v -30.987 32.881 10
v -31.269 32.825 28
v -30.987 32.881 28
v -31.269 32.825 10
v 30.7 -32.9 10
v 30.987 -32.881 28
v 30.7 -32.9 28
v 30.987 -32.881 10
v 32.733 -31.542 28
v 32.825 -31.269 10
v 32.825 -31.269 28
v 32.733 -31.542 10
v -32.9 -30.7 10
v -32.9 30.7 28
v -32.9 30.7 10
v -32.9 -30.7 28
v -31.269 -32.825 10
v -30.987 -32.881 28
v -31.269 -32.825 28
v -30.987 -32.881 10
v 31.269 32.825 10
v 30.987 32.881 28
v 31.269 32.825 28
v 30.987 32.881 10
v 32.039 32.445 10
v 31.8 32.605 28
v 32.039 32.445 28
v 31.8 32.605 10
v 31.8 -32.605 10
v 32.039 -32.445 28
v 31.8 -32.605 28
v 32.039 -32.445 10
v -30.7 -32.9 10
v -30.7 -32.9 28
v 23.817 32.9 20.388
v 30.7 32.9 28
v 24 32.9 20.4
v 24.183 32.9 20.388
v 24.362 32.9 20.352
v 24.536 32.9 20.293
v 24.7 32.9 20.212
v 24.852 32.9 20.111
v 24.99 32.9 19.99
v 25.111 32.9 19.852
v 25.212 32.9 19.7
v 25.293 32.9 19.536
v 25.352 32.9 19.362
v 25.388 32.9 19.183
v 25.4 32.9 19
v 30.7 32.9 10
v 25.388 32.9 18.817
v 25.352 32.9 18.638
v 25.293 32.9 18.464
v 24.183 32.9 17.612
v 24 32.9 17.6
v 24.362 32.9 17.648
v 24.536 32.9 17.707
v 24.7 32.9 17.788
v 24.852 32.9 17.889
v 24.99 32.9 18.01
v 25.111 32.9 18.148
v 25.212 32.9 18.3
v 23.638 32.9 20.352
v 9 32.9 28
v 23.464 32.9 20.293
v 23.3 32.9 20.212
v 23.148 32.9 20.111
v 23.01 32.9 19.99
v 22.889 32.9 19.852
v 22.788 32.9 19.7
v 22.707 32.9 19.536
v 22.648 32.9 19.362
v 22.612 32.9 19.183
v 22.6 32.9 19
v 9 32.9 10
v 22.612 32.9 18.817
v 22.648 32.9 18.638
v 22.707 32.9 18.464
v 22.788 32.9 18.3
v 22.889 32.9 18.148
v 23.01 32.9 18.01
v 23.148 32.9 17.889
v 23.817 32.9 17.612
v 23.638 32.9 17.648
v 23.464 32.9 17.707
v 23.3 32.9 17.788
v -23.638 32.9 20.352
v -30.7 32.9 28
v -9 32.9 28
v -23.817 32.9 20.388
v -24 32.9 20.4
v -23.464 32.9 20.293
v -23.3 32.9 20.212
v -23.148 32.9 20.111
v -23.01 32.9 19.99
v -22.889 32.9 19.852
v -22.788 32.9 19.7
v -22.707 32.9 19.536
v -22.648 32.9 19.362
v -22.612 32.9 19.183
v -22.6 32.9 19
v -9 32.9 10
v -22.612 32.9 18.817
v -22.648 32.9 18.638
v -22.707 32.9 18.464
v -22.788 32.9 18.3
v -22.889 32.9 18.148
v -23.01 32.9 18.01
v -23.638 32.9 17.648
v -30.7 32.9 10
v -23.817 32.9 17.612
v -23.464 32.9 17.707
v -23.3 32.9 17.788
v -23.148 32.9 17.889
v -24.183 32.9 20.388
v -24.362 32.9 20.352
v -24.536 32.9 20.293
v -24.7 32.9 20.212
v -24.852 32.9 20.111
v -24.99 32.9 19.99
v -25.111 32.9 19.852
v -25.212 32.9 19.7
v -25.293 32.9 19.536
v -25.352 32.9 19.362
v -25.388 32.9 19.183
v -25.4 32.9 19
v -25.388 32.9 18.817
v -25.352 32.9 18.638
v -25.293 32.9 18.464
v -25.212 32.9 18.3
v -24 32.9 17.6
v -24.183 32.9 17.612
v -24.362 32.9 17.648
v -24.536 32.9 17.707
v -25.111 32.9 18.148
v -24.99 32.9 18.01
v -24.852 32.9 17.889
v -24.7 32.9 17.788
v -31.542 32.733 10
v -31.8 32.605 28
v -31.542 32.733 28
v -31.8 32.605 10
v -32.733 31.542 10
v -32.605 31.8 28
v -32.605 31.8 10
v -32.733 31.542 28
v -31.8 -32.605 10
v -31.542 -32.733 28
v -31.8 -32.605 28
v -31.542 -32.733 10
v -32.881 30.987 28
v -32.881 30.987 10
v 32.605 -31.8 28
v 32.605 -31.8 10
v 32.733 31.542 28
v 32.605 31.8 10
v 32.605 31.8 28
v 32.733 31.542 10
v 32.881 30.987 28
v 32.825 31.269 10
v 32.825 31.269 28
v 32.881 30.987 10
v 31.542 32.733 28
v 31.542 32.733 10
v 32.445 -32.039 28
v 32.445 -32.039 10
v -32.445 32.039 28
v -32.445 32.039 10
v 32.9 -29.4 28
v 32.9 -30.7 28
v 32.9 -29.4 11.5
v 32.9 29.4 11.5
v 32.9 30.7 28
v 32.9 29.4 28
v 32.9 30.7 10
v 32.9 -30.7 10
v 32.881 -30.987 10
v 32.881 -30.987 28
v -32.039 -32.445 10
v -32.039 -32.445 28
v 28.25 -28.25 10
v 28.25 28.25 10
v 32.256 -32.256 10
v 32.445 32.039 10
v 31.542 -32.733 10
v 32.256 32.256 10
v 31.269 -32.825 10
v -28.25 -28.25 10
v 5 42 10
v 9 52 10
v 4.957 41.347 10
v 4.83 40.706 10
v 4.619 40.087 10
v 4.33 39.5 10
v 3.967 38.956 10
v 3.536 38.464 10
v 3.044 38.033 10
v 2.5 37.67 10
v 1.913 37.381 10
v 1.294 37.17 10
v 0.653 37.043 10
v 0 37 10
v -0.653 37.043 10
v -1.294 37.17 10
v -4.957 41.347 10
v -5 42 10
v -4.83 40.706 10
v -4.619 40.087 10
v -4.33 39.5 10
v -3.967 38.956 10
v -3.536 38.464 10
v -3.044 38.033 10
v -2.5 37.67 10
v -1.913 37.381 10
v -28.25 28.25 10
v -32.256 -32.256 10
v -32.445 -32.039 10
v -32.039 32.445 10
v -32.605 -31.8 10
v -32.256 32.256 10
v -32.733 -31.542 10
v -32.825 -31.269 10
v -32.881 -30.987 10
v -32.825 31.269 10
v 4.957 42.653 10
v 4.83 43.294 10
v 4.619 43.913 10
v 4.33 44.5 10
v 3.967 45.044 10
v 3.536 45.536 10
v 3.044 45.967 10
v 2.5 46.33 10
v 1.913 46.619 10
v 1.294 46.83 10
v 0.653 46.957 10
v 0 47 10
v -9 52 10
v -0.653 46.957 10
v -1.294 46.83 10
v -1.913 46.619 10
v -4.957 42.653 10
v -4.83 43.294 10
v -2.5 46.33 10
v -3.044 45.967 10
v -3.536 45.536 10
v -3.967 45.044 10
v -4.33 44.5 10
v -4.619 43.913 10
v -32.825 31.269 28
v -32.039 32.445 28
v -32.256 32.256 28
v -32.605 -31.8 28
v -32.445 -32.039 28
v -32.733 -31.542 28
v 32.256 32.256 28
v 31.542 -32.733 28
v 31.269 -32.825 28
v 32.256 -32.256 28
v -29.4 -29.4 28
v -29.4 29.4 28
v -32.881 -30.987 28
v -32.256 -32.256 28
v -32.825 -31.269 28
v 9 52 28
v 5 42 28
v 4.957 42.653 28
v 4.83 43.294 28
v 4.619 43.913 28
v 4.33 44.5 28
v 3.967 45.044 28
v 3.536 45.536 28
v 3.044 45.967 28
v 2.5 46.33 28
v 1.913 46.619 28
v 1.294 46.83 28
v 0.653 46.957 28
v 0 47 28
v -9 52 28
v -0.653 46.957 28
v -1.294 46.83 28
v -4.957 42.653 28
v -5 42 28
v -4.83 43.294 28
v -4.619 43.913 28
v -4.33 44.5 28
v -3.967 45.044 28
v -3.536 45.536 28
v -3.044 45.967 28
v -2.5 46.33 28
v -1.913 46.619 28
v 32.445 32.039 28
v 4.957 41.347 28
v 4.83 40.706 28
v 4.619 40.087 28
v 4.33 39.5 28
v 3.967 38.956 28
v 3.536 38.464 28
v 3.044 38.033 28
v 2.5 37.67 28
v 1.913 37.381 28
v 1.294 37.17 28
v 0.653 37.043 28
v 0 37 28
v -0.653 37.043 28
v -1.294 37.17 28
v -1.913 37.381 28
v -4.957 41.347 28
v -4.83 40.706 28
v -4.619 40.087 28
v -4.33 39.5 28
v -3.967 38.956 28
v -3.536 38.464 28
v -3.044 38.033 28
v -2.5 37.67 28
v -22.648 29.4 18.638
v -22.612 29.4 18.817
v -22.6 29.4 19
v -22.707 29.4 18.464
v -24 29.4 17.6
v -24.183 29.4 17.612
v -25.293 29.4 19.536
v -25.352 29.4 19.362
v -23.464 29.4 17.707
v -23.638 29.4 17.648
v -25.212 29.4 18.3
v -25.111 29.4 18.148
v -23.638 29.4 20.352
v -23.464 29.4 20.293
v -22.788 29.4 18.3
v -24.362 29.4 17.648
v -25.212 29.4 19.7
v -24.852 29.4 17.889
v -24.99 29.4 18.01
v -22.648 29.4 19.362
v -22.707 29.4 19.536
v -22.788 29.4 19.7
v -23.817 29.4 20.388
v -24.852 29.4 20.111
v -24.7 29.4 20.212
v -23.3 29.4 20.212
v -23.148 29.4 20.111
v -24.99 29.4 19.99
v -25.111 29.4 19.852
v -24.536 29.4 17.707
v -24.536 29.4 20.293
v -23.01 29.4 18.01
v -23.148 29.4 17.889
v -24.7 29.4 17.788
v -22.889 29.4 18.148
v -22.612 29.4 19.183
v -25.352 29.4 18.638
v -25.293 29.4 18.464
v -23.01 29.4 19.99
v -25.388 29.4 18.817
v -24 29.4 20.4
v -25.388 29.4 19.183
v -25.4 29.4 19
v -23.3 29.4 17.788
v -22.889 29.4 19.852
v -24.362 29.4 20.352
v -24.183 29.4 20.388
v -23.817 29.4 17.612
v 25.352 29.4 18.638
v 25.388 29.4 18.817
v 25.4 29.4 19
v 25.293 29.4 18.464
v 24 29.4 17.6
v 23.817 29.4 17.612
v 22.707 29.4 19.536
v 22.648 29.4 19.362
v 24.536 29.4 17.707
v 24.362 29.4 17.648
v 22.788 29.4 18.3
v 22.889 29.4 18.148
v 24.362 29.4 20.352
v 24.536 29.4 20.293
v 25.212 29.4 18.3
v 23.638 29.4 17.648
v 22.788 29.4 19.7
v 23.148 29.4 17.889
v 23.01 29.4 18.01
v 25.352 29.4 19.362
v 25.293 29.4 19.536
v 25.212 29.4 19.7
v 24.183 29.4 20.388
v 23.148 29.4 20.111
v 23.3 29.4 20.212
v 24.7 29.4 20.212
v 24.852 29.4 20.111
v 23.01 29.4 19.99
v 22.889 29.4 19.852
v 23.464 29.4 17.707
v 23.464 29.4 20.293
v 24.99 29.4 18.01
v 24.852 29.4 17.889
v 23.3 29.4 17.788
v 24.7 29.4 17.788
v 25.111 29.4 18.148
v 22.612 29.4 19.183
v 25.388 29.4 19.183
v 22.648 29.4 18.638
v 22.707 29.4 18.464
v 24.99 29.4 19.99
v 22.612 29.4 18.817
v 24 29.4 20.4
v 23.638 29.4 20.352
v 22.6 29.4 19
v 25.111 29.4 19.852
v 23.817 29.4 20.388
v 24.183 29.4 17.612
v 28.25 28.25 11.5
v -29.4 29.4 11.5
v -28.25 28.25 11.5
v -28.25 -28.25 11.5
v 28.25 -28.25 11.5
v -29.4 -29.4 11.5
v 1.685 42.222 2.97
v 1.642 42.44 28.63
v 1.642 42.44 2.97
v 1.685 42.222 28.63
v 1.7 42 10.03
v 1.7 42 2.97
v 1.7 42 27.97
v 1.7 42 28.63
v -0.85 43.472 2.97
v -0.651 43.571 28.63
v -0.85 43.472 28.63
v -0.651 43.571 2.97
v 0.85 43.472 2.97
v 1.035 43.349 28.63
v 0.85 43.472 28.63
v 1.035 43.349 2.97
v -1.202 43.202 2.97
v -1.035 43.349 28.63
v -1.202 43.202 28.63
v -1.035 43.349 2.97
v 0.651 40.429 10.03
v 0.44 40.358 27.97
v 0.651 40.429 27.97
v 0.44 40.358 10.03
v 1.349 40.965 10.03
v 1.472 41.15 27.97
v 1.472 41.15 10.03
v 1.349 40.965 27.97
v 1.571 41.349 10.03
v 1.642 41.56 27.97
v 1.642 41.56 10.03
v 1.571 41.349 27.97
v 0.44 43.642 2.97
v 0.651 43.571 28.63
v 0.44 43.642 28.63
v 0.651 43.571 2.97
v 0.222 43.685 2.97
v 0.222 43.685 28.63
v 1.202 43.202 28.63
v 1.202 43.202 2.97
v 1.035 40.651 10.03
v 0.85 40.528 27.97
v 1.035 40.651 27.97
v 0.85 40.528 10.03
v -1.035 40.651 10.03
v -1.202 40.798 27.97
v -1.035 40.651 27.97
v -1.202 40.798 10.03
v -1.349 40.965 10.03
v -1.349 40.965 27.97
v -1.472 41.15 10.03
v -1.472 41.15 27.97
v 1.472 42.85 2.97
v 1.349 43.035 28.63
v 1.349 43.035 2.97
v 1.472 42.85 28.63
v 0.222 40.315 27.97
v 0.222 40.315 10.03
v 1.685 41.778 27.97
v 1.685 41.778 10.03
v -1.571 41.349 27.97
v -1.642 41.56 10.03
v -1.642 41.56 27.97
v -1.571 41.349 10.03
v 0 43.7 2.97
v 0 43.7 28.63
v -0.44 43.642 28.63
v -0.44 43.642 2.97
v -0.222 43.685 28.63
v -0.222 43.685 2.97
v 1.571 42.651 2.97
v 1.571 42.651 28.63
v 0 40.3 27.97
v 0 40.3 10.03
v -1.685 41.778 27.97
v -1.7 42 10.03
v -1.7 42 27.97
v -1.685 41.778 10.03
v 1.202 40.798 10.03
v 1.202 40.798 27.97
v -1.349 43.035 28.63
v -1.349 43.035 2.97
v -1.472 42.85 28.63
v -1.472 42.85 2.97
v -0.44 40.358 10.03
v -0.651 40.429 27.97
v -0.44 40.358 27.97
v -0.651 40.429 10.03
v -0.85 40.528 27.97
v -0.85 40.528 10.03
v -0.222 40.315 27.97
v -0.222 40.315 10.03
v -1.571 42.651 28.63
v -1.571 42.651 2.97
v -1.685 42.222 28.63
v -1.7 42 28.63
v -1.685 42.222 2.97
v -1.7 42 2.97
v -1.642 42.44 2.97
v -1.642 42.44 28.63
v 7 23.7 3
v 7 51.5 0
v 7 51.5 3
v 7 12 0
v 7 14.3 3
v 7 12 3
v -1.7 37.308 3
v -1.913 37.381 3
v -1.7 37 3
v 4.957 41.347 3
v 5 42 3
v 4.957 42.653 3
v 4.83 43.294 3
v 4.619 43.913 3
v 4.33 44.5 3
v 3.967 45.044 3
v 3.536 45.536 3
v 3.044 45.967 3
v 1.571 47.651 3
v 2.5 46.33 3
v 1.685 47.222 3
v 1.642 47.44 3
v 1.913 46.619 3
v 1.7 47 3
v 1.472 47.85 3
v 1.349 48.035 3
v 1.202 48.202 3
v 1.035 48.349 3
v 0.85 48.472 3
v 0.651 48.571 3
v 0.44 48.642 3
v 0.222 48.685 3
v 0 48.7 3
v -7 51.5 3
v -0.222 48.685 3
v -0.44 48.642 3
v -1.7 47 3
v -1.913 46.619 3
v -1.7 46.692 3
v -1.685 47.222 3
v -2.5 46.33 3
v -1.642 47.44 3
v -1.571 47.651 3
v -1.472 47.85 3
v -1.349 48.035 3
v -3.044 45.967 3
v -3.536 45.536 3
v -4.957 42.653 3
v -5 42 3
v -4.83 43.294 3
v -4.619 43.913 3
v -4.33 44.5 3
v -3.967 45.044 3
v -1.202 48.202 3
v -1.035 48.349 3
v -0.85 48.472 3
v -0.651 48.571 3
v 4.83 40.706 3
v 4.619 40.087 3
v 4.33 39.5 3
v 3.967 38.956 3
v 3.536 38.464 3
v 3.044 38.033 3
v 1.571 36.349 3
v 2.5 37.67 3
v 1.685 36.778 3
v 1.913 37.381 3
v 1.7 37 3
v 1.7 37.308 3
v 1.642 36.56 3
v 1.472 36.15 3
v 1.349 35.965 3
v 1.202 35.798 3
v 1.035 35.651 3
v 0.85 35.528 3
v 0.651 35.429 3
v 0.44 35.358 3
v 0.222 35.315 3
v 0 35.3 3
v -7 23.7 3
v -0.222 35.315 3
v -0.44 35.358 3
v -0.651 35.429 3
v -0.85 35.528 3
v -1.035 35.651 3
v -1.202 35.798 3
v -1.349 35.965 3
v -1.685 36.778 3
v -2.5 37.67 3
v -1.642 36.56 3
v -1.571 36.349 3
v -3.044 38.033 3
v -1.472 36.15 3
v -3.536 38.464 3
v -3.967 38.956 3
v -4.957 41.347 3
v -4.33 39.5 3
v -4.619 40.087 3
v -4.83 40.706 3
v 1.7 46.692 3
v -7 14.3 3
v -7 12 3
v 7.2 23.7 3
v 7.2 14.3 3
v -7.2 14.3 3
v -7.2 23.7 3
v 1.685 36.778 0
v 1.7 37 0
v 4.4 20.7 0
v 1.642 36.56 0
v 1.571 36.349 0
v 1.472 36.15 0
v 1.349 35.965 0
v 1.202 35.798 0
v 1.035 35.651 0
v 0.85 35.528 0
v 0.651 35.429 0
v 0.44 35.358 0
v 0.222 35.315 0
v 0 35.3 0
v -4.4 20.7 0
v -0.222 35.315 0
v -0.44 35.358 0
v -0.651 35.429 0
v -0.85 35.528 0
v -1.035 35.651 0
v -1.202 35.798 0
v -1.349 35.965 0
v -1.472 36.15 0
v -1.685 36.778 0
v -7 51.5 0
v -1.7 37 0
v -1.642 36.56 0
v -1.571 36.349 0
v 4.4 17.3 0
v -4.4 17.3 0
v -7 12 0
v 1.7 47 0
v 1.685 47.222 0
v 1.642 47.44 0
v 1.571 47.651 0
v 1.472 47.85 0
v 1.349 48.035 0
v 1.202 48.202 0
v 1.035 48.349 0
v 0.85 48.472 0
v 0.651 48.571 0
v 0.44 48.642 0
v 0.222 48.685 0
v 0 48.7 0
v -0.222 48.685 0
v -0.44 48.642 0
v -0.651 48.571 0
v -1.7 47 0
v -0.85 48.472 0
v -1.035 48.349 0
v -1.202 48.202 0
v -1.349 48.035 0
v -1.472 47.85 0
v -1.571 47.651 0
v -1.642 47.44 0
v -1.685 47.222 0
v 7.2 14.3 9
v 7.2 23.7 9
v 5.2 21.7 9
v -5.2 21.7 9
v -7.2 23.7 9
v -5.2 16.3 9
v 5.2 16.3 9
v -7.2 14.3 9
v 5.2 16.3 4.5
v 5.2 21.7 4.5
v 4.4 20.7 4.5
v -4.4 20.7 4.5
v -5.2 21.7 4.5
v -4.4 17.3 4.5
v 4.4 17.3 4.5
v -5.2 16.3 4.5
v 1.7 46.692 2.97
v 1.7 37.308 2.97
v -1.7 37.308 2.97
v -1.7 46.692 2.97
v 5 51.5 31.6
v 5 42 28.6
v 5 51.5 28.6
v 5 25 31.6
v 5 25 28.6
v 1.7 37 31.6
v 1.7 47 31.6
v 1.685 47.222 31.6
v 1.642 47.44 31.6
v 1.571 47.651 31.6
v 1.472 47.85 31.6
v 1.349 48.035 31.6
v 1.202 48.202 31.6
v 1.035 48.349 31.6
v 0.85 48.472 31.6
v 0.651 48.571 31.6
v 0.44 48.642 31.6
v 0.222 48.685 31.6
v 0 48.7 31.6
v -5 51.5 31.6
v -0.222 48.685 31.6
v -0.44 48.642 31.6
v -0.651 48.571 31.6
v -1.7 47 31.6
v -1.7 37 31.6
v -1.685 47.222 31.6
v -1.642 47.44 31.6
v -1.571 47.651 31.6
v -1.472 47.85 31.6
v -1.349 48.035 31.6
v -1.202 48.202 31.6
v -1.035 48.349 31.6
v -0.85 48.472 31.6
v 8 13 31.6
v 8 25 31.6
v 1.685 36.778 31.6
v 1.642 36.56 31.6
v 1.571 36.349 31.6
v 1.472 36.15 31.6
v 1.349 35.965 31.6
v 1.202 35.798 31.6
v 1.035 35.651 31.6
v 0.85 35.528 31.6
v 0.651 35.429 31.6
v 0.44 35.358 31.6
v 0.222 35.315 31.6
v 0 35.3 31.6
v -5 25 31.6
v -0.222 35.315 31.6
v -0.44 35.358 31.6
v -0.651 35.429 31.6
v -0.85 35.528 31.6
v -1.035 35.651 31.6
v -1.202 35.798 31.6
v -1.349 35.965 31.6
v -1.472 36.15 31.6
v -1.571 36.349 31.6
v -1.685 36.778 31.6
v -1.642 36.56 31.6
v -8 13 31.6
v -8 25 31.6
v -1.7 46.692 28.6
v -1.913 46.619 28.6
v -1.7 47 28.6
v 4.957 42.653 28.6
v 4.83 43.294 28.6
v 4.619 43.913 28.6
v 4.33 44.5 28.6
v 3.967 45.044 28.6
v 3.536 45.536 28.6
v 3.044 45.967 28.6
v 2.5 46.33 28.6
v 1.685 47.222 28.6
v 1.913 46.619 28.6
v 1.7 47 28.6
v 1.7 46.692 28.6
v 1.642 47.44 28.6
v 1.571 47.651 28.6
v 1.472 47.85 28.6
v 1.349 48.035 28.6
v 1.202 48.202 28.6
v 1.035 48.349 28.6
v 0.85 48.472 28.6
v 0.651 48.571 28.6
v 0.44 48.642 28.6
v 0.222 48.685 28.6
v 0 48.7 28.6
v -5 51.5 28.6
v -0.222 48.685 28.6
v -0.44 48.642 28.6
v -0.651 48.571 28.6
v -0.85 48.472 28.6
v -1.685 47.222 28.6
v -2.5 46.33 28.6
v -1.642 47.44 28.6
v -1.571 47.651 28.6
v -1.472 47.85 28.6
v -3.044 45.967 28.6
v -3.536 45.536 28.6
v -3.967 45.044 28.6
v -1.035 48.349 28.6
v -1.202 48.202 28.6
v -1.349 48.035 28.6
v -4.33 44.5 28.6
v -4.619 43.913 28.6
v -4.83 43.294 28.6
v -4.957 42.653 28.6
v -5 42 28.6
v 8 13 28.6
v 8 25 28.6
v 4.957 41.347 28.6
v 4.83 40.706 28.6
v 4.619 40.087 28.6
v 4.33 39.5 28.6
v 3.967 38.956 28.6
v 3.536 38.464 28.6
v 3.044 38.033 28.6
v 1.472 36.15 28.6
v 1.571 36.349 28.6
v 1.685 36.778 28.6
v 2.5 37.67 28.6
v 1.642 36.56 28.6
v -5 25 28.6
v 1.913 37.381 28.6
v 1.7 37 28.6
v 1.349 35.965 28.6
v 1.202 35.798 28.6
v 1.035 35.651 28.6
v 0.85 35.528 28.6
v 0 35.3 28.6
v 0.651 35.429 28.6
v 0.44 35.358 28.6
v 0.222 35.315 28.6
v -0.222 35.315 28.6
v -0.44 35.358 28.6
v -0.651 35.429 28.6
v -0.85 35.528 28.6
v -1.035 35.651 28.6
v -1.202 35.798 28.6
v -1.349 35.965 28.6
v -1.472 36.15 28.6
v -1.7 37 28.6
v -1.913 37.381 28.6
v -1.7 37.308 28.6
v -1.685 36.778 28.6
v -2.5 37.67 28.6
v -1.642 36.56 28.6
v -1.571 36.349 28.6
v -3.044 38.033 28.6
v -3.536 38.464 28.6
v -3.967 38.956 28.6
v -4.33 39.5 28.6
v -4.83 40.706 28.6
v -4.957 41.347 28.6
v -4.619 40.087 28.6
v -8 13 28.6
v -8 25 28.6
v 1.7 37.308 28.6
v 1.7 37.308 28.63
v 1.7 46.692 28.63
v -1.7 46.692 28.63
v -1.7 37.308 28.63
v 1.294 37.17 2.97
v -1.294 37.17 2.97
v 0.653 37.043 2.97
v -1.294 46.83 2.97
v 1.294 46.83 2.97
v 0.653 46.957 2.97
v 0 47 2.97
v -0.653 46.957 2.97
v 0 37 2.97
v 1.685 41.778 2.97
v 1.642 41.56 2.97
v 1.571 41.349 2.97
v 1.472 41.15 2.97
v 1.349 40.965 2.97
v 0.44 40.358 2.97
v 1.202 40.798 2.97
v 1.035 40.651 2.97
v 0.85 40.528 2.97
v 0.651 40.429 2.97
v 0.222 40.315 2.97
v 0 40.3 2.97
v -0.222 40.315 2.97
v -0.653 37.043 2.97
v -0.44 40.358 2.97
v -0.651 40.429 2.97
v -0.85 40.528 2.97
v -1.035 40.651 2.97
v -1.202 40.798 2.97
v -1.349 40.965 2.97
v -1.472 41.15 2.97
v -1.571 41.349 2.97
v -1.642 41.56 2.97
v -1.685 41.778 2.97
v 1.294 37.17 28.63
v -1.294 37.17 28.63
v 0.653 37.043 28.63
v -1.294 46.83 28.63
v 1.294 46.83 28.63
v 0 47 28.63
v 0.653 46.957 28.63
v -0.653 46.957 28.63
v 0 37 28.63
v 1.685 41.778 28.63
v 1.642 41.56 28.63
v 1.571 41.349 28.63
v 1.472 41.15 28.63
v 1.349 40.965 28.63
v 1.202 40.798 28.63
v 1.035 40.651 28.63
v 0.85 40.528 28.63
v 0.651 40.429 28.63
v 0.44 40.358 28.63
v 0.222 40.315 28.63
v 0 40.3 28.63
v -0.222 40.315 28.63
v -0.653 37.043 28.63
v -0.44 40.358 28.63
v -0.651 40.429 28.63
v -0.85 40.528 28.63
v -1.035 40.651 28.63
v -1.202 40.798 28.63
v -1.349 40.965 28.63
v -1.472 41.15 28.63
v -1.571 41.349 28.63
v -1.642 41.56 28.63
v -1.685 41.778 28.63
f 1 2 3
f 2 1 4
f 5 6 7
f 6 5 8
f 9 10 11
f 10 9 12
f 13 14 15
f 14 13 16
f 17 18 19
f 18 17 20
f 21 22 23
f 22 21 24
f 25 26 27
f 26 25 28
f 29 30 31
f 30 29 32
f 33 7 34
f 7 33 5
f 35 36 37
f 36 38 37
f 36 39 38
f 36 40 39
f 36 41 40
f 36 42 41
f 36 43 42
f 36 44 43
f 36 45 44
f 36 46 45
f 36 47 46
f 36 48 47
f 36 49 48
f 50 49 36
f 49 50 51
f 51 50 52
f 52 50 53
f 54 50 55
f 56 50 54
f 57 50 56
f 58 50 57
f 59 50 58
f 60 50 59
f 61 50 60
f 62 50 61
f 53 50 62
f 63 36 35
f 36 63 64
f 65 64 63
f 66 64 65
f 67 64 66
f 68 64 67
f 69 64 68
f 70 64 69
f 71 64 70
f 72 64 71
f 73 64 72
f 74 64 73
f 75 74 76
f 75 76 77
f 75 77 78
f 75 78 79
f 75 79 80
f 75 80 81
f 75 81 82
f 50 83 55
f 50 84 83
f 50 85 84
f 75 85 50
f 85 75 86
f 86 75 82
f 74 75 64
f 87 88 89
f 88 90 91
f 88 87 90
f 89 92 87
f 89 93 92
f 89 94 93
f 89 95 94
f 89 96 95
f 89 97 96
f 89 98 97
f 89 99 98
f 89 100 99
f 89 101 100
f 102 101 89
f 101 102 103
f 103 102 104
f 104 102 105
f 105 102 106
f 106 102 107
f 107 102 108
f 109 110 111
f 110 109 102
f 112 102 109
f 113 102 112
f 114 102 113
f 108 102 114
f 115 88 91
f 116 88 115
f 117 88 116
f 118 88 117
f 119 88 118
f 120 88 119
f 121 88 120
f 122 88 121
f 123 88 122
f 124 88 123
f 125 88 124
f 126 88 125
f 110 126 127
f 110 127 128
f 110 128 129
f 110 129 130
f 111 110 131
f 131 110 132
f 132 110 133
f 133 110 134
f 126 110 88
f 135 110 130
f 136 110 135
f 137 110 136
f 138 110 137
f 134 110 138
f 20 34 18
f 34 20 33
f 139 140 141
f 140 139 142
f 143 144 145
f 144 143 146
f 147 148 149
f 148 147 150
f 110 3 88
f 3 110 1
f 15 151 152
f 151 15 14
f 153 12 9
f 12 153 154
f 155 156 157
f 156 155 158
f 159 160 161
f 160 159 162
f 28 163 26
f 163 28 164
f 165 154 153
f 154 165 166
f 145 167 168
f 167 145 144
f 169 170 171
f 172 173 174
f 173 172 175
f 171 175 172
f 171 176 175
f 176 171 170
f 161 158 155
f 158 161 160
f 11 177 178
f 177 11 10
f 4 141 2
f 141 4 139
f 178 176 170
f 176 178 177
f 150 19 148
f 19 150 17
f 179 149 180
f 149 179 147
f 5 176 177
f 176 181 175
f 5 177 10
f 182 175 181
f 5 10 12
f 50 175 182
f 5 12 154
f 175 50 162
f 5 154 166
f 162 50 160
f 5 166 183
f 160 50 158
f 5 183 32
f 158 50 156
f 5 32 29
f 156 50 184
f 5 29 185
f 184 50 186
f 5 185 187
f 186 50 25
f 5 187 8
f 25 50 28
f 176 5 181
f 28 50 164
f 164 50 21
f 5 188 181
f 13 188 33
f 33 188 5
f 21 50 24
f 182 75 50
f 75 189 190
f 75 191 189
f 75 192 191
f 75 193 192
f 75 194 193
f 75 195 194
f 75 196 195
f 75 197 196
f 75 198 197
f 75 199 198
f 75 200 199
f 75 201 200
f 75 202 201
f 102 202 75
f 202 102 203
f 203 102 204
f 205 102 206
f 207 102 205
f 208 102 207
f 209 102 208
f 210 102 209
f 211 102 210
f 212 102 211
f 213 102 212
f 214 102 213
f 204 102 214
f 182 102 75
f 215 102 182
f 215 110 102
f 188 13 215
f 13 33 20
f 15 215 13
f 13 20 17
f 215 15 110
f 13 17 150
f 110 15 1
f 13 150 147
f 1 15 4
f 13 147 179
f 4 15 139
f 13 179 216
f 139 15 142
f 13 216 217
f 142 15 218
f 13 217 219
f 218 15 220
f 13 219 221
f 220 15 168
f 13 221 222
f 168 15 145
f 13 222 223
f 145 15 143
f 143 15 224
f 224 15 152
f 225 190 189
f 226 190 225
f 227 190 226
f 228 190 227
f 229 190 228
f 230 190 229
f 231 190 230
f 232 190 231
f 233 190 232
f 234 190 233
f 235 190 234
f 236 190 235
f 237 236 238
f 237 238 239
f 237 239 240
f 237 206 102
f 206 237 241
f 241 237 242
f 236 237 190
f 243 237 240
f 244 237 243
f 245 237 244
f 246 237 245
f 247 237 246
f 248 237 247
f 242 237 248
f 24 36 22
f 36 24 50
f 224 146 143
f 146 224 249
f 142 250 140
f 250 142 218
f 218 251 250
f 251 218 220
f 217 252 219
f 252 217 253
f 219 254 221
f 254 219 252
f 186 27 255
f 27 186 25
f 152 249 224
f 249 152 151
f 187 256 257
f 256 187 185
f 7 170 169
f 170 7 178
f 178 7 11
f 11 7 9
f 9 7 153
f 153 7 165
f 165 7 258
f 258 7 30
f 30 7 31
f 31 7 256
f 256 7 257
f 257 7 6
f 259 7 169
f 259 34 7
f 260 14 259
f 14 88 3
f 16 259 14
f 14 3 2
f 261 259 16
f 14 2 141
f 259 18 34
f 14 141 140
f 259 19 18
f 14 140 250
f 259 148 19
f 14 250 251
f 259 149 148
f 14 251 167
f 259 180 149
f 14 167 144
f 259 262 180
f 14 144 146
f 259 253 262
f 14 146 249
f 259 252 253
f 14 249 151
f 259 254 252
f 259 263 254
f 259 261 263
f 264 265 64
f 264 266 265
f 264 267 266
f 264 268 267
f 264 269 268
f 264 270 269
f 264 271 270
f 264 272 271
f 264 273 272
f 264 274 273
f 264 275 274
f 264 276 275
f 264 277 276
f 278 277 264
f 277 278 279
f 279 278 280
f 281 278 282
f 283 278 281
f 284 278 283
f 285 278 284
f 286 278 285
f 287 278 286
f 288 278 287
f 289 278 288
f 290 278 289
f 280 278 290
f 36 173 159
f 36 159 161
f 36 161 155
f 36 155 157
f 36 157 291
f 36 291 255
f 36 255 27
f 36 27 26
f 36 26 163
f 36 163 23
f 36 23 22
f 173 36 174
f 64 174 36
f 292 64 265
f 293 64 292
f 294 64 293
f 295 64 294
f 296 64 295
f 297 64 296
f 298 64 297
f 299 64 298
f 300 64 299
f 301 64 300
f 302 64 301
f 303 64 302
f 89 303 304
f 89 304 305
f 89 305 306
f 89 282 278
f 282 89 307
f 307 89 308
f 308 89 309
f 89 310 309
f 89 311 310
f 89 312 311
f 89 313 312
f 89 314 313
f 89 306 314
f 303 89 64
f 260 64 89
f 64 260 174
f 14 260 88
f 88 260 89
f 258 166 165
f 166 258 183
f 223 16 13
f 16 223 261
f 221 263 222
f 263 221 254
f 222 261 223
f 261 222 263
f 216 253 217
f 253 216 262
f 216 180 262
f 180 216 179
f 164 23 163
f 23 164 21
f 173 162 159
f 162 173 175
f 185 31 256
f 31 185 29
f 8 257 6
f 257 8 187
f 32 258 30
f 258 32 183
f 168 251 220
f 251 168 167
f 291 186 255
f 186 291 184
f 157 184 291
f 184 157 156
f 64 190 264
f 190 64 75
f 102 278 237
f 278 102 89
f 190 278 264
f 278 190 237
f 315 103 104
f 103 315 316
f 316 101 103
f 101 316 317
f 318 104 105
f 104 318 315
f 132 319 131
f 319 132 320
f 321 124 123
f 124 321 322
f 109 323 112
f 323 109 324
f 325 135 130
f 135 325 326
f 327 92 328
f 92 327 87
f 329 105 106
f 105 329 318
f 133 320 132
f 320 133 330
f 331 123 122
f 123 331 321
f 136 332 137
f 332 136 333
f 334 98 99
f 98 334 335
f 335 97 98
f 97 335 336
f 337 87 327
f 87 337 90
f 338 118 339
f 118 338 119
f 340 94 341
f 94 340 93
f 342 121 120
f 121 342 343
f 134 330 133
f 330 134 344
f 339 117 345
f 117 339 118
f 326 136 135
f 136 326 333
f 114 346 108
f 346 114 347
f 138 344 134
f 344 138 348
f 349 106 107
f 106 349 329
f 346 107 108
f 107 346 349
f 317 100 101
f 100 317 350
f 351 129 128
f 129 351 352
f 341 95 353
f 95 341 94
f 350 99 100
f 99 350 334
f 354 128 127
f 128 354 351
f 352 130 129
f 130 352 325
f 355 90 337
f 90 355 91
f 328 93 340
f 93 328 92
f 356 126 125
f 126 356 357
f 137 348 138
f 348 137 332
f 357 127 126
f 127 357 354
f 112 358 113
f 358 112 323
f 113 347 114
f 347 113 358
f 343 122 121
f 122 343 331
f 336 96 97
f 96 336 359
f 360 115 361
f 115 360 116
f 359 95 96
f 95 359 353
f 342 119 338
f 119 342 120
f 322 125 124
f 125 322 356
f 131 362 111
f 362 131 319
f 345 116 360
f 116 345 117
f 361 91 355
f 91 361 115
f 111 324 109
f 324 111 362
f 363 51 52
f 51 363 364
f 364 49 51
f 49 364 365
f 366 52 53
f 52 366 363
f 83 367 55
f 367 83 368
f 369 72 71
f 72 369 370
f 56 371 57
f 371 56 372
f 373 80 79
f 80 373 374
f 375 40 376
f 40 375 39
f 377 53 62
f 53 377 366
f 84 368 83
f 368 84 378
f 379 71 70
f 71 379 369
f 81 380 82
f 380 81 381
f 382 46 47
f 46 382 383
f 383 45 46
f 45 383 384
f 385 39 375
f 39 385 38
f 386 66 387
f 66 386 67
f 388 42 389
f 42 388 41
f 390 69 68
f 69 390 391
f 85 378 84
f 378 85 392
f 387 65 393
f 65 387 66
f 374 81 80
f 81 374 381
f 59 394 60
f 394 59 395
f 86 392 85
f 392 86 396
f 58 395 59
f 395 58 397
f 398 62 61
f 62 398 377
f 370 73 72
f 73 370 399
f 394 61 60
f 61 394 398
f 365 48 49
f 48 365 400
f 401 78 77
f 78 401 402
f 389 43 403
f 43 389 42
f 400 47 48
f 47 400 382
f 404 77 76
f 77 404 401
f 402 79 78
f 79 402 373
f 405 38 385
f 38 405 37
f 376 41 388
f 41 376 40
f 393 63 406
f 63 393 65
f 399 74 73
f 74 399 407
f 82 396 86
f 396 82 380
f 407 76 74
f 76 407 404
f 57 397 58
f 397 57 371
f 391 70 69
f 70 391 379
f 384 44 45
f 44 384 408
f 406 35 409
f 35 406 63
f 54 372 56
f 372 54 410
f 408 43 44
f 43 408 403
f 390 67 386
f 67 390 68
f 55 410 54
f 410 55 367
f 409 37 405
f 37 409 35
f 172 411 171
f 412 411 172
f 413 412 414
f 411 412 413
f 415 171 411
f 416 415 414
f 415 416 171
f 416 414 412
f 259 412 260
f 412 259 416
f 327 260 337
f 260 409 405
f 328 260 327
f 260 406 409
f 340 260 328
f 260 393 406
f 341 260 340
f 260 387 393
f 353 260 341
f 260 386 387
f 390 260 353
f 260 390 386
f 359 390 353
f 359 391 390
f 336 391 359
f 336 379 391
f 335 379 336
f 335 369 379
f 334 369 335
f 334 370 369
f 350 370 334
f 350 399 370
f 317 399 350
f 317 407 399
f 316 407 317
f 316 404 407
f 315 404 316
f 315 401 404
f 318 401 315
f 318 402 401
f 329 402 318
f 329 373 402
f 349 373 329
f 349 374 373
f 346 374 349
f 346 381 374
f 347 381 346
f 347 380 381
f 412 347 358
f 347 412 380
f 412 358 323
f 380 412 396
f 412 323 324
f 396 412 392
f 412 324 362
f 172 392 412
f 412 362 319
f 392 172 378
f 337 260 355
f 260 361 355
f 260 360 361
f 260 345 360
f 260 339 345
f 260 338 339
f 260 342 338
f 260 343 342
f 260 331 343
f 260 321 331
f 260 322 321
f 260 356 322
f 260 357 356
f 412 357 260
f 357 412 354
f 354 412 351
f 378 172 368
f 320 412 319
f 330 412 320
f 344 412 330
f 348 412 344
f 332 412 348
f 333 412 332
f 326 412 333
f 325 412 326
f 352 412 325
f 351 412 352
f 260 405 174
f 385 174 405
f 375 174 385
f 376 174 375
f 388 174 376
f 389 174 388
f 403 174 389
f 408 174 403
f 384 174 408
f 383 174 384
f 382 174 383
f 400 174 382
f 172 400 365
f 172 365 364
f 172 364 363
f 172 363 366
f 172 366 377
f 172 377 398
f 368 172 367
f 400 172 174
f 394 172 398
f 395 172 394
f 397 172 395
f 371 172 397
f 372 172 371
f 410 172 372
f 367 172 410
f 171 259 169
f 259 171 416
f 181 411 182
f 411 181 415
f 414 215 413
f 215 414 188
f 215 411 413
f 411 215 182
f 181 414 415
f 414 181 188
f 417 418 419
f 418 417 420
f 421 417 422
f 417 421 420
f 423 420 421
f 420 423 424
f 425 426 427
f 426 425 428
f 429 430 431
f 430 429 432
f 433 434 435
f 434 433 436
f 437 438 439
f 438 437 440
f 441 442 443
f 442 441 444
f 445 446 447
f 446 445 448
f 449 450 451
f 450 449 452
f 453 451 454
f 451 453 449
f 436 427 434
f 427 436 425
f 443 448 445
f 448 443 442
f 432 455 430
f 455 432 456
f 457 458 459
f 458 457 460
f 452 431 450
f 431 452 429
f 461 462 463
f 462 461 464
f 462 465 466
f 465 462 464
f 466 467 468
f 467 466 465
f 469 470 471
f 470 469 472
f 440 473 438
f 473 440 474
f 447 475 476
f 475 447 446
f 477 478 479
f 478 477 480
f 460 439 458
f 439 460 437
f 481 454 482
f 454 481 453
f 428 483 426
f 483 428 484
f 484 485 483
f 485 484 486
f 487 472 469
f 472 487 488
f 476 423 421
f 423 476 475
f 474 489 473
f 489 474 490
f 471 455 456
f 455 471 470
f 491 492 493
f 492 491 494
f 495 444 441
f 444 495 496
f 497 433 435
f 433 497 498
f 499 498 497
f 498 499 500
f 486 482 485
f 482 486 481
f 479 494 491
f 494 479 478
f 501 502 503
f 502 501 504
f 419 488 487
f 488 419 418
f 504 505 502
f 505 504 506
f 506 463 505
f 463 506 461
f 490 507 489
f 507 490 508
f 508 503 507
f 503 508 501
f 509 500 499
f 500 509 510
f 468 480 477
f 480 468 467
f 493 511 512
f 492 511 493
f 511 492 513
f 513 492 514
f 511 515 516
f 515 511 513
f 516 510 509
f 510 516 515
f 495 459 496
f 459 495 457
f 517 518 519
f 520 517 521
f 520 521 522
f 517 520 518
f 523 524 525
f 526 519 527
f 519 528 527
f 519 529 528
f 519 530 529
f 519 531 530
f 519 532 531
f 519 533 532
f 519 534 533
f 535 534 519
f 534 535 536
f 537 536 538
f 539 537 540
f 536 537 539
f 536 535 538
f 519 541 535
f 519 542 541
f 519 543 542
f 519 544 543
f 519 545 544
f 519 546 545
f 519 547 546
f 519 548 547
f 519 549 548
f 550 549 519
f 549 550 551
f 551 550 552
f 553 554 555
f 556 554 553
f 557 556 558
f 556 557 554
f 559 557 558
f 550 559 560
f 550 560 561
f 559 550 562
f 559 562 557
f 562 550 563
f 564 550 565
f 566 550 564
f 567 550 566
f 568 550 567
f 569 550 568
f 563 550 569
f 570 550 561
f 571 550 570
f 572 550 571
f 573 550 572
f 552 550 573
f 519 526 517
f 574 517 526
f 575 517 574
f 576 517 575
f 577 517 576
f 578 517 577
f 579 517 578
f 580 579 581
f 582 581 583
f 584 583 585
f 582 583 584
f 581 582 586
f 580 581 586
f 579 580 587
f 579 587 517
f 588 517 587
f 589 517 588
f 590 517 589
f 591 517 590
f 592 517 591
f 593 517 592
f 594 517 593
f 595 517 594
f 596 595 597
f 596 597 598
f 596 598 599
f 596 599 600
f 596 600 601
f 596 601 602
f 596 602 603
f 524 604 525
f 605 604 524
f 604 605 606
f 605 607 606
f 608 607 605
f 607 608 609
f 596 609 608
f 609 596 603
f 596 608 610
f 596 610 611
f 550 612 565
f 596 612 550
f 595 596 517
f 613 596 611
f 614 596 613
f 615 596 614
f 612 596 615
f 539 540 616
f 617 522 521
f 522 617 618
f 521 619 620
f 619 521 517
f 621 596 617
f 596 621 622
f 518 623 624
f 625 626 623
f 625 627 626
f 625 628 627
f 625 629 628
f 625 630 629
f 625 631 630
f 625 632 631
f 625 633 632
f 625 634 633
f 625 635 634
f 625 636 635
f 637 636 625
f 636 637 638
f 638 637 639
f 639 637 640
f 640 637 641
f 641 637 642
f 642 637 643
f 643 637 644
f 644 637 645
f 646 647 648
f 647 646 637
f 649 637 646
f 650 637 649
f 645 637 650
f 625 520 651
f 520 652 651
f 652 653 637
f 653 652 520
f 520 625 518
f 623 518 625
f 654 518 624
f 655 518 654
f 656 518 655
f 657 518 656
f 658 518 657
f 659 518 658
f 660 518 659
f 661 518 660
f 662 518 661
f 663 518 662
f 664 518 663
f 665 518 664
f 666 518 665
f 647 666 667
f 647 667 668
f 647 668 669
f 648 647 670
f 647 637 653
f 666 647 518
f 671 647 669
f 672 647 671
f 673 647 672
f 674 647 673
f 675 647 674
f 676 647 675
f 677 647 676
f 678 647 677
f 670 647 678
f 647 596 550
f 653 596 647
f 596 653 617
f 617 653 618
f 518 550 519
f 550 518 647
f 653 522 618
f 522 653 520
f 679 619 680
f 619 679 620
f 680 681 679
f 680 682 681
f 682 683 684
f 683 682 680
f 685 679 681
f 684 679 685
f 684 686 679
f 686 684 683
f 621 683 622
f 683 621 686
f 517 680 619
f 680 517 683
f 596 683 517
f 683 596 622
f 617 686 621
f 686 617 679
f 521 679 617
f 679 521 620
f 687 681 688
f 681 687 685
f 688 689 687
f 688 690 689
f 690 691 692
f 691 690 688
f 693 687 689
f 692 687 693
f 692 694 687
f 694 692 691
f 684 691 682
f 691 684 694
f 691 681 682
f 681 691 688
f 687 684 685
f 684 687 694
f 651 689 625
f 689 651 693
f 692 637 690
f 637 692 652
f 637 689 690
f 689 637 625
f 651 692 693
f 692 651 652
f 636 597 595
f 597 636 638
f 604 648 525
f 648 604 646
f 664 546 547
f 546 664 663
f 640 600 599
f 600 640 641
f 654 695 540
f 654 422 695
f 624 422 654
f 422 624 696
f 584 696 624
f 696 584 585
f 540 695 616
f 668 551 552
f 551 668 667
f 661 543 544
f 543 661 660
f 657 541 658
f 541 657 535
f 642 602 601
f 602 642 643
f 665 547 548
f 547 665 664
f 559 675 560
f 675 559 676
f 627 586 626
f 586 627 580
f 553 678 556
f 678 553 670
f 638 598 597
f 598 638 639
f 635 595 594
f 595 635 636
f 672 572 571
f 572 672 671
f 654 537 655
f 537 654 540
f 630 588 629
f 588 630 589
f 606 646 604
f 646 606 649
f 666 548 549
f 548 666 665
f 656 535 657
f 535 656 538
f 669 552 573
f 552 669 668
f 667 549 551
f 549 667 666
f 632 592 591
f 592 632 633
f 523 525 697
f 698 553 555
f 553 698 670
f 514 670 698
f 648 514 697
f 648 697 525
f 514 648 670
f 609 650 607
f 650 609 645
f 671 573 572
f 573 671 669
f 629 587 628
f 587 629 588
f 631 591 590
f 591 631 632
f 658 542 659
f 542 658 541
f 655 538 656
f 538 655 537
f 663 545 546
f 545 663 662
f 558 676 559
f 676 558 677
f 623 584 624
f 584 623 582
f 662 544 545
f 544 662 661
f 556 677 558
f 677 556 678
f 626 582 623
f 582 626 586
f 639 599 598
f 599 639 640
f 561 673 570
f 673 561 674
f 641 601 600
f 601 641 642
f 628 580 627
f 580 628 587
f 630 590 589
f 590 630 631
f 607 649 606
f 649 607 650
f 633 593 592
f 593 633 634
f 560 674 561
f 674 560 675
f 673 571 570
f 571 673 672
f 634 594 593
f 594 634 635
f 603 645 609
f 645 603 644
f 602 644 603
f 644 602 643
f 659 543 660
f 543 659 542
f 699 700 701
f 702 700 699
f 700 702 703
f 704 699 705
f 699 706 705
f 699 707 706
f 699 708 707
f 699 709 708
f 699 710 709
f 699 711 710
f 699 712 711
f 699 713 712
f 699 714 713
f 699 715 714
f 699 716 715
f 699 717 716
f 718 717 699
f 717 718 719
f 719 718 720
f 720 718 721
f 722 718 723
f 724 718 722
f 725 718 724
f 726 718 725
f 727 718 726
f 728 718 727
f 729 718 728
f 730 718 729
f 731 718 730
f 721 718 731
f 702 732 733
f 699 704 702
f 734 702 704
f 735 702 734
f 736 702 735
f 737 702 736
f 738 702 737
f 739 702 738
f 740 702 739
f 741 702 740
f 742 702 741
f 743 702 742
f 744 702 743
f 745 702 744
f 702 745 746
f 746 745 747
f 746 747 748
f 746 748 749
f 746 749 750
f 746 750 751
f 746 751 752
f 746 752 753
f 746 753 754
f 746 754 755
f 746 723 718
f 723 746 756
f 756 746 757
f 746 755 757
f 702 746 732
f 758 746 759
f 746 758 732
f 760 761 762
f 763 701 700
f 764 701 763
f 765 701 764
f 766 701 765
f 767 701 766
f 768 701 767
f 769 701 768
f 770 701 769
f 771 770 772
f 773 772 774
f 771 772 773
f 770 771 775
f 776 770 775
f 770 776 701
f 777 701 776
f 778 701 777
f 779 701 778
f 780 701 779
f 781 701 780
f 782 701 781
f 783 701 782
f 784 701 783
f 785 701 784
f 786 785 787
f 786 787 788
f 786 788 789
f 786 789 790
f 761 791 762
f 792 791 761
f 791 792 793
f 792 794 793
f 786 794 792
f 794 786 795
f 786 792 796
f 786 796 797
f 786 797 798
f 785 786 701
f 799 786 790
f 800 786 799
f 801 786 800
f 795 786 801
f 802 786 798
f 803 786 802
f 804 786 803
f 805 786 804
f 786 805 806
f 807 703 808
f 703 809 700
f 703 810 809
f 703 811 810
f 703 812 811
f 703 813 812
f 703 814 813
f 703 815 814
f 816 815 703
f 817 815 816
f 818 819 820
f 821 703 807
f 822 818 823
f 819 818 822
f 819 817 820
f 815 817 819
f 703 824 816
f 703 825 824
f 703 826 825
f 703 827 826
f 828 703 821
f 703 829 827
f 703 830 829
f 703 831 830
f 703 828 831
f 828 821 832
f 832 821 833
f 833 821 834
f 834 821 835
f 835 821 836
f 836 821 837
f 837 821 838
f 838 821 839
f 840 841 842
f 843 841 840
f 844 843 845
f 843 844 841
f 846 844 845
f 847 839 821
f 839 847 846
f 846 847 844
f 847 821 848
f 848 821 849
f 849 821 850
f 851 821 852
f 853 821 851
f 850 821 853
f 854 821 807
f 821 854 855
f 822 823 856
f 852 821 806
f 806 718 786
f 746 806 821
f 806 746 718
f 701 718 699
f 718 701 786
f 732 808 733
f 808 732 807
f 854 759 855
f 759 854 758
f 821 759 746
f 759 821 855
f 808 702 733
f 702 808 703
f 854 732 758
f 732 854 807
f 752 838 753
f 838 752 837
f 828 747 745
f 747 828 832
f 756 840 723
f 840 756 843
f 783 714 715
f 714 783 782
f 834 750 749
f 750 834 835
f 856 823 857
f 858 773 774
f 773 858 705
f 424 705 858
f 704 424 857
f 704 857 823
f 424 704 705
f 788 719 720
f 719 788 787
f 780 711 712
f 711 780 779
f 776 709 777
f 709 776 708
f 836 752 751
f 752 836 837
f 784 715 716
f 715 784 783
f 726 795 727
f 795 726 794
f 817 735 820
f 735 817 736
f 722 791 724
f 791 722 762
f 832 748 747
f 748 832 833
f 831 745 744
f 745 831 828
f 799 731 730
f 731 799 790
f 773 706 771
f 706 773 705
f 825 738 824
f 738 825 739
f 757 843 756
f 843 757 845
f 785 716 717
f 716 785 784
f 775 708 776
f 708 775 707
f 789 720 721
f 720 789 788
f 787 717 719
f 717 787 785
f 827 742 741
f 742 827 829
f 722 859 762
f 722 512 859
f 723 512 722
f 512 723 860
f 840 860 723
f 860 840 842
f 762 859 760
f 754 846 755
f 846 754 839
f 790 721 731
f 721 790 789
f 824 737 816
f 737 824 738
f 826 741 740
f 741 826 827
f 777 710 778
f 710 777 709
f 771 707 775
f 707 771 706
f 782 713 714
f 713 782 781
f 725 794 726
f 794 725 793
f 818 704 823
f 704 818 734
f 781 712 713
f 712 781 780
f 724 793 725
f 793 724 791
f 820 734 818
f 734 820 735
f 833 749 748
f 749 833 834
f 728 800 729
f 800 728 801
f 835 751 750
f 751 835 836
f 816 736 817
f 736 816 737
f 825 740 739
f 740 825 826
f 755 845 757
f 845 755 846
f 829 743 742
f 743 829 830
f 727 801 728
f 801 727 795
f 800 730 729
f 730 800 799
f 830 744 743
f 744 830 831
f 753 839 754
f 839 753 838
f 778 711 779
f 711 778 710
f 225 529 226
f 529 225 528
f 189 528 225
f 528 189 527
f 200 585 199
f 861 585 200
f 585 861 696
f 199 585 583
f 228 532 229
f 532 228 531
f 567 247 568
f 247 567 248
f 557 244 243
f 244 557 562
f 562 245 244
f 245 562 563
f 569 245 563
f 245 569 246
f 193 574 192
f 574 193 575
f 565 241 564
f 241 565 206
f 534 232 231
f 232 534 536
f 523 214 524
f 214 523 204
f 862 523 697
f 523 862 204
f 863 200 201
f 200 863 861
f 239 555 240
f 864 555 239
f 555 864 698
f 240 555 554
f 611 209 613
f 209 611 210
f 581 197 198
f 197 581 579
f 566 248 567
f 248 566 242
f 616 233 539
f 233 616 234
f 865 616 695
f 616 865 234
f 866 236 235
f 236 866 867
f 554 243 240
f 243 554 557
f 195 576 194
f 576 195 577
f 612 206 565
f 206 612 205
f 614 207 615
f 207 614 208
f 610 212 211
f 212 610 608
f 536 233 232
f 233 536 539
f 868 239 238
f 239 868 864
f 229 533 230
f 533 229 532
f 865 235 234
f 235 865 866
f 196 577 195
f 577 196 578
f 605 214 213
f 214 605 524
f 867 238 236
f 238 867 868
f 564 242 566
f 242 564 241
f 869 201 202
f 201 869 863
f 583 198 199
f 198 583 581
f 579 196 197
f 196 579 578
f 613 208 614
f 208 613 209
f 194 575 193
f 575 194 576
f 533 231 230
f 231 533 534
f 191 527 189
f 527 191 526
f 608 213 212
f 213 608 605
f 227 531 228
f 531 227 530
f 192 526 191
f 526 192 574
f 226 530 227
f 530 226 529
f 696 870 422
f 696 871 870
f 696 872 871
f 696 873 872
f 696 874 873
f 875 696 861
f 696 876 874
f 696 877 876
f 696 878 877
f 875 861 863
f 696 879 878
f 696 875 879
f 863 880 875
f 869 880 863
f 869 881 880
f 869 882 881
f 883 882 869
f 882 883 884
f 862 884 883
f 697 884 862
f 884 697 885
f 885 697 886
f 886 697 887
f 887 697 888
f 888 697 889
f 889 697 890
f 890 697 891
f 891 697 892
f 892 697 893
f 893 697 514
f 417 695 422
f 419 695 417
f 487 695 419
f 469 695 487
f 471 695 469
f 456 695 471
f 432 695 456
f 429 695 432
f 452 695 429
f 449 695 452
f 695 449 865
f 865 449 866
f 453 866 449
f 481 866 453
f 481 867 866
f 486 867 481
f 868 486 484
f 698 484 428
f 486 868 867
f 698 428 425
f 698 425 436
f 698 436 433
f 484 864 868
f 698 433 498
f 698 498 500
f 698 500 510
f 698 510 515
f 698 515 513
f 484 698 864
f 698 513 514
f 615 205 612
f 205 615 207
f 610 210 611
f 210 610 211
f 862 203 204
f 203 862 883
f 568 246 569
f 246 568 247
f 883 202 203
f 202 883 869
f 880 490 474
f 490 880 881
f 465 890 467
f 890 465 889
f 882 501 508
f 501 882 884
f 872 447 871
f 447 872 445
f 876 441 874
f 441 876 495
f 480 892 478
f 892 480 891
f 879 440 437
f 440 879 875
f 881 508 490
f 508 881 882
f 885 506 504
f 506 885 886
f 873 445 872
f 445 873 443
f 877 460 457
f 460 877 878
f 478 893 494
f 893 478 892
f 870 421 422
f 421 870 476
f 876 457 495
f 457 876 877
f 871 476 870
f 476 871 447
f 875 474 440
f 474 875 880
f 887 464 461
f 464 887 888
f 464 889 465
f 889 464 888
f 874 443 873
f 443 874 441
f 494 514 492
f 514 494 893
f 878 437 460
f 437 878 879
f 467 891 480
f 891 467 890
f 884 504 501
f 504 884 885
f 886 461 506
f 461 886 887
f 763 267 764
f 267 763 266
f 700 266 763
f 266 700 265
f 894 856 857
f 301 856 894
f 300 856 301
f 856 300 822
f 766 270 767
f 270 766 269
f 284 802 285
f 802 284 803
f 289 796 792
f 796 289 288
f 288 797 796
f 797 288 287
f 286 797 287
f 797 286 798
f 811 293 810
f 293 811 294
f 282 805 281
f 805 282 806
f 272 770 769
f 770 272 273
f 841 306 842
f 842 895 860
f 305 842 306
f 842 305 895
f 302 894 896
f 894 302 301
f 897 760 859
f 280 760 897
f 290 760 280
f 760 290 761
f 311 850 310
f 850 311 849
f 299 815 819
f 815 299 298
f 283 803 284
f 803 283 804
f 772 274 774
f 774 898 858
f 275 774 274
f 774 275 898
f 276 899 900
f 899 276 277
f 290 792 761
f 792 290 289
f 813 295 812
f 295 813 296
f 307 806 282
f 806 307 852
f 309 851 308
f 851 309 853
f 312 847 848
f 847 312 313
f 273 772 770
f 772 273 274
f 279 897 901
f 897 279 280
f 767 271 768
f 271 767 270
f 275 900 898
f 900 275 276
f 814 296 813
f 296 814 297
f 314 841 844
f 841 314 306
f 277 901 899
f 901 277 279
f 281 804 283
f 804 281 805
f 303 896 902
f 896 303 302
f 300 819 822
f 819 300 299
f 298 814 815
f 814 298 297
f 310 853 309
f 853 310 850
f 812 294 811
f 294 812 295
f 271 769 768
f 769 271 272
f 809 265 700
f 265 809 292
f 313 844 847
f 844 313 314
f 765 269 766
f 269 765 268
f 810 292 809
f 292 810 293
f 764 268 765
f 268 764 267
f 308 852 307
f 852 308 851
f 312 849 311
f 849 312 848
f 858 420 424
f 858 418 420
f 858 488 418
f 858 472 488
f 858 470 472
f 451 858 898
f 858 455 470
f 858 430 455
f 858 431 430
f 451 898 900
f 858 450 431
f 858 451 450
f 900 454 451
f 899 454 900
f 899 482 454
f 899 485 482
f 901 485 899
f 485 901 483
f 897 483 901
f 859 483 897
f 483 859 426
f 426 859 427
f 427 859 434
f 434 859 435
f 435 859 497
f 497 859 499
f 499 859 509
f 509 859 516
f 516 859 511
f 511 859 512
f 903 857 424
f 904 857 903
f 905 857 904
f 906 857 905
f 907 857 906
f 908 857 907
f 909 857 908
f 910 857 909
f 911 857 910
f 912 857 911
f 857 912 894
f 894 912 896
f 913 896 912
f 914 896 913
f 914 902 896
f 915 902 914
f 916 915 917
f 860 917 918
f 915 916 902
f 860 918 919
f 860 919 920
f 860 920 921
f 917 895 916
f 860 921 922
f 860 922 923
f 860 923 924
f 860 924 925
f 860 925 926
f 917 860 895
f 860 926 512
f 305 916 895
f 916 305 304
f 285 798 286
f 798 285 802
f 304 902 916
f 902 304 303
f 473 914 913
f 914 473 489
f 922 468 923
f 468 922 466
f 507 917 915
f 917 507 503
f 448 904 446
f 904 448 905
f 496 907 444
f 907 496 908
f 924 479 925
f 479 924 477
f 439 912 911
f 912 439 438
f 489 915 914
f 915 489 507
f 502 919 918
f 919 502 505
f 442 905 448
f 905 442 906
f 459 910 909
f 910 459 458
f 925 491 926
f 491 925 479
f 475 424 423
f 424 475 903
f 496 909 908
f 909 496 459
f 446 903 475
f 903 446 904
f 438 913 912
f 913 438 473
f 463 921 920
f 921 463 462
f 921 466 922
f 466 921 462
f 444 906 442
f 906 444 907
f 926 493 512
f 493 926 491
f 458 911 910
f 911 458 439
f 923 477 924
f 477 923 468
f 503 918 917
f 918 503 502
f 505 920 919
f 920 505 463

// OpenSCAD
/* Henrique | Protótipo V1 | unidades: mm
   Fan: 58 x 58 x 15. TCRT5000 avulso: 10 x 5 x 5, informado.
   Montagem com sensor frontal e alvo branco traseiro localizado.
   A distância óptica nominal é ~19.1 mm: validar eletricamente ANTES
   de imprimir. Isto não garante a leitura do alvo pelo TCRT5000.
   Rotação, cubo e travessas reais da ventoinha ainda não foram medidos.
   Abra part="assembly" para montagem; "layout" para peças de impressão.
*/
part = "integral";
$fn = 48;

fan_w = 58;
fan_h = 58;
fan_depth = 15;
fan_clearance_side = 0.40;
wall = 3.5;
lip_height = 1.5;
lip_opening = 56.5;
frame_depth = 18;

sensor_w = 10;
sensor_h = 5;
sensor_depth = 5;
sensor_clearance_side = 0.20;
sensor_radial = 19;           // deslocamento nominal em Y, ajustável +/-5
sensor_front_gap = 2;        // distância lente / face frontal da ventoinha
target_radial = 19;          // alinhar com sensor, ajustável +/-5
target_w = 16;
target_h = 12;
rear_spacer_height = 0.6;    // distância alvo/face traseira = 2.1 mm

mount_y = 42;
mount_hole_d = 3.4;
arm_thickness = 3;
radial_adjust = 5;
sensor_floor_top = 4.5;
sensor_wall_top = sensor_floor_top + sensor_depth - 0.5;
sensor_optical_z = sensor_floor_top + sensor_depth;
front_arm_z = lip_height - sensor_front_gap - sensor_optical_z;
front_spacer_height = -front_arm_z - arm_thickness;
rear_arm_z = frame_depth + rear_spacer_height;

inner_w = fan_w + 2*fan_clearance_side;
inner_h = fan_h + 2*fan_clearance_side;
outer_w = inner_w + 2*wall;
outer_h = inner_h + 2*wall;
sensor_iw = sensor_w + 2*sensor_clearance_side;
sensor_ih = sensor_h + 2*sensor_clearance_side;

echo("Optical distance sensor / white target (mm)",
     rear_arm_z - (lip_height-sensor_front_gap));
echo("Front spacer height (mm)", front_spacer_height);

module rr(w,h,r=2) {
  offset(r=r) square([w-2*r,h-2*r],center=true);
}
module slot_y(y0,y1,d,h) {
  hull() {
    translate([0,y0,0]) cylinder(d=d,h=h);
    translate([0,y1,0]) cylinder(d=d,h=h);
  }
}

module frame() {
  difference() {
    union() {
      linear_extrude(frame_depth) rr(outer_w,outer_h,2.2);
      // A aba fica fora da passagem de ar; não usa os furos da ventoinha.
      translate([-9,outer_h/2-1,0])
        cube([18,52-(outer_h/2-1),frame_depth]);
    }
    // Encaixe de 58.8 x 58.8, com lábio de apoio frontal.
    translate([-inner_w/2,-inner_h/2,lip_height])
      cube([inner_w,inner_h,frame_depth+1]);
    translate([-lip_opening/2,-lip_opening/2,-0.2])
      cube([lip_opening,lip_opening,lip_height+0.4]);
    translate([0,mount_y,-0.2]) cylinder(d=mount_hole_d,h=frame_depth+0.4);
    // Janela de carregamento lateral: permite inserir a ventoinha em +X
    // mesmo com os dois braços já fundidos à moldura na versão integral.
    // O lábio z=0..1.5 permanece como guia, abaixo da carcaça.
    translate([inner_w/2-0.1,-inner_h/2,lip_height])
      cube([wall+1,inner_h,frame_depth+1]);
    // Pilotos para dois parafusos M3 apertados levemente na carcaça fixa.
    // Não correspondem aos furos originais da ventoinha.
    for(x=[-24,24])
      translate([x,fan_h/2-1,lip_height+fan_depth/2])
        rotate([-90,0,0]) cylinder(d=2.8,h=wall+4);
  }
}

module front_arm() {
  difference() {
    union() {
      translate([-7,12,0]) cube([14,39.5,arm_thickness]);
      // Assento aberto, com passagem dos quatro terminais pelo fundo.
      translate([-(sensor_iw+4)/2,sensor_radial-(sensor_ih+4)/2,arm_thickness])
        cube([sensor_iw+4,sensor_ih+4,sensor_wall_top-arm_thickness]);
    }
    translate([-sensor_iw/2,sensor_radial-sensor_ih/2,sensor_floor_top])
      cube([sensor_iw,sensor_ih,sensor_depth+4]);
    translate([-4.4,sensor_radial-1.7,-0.2]) cube([8.8,3.4,sensor_floor_top+0.4]);
    translate([0,0,-0.2])
      slot_y(mount_y-radial_adjust,mount_y+radial_adjust,mount_hole_d,arm_thickness+0.4);
  }
}

module rear_arm() {
  difference() {
    union() {
      translate([-5,target_radial,0]) cube([10,51.5-target_radial,arm_thickness]);
      // O alvo branco vai na face z=0, voltada ao sensor.
      translate([-target_w/2,target_radial-target_h/2,0])
        cube([target_w,target_h,arm_thickness]);
    }
    translate([0,0,-0.2])
      slot_y(mount_y-radial_adjust,mount_y+radial_adjust,mount_hole_d,arm_thickness+0.4);
  }
}

module spacer(h) {
  difference() {
    cylinder(d=10,h=h);
    translate([0,0,-0.2]) cylinder(d=mount_hole_d,h=h+0.4);
  }
}

module fan_reference() {
  // Somente referência visual. Não é peça para imprimir nem rotor medido.
  translate([0,0,lip_height]) {
    difference() {
      linear_extrude(fan_depth) rr(fan_w,fan_h,3);
      translate([0,0,-0.1]) cylinder(d=54,h=fan_depth+0.2);
    }
    cylinder(d=20,h=fan_depth);
    for(a=[0:60:300]) rotate([0,0,a]) translate([0,0,fan_depth/2])
      linear_extrude(1) polygon([[8,-2],[25,-4],[24,6],[11,7]]);
  }
}

module assembly(explode=0,reference=true) {
  color("slategray") frame();
  translate([0,0,front_arm_z-explode]) color("darkorange") front_arm();
  translate([0,mount_y,-front_spacer_height-explode/2])
    color("silver") spacer(front_spacer_height);
  translate([0,0,rear_arm_z+explode]) color("white") rear_arm();
  translate([0,mount_y,frame_depth+explode/2])
    color("silver") spacer(rear_spacer_height);
  if(reference) %color([0.15,0.25,0.35,0.35]) fan_reference();
}

if(part=="frame") frame();
else if(part=="front_arm") front_arm();
else if(part=="rear_arm") rear_arm();
else if(part=="front_spacer") spacer(front_spacer_height);
else if(part=="rear_spacer") spacer(rear_spacer_height);
else if(part=="reference_fan") fan_reference();
else if(part=="integral") translate([0,0,-front_arm_z]) union() {
  frame();
  translate([0,0,front_arm_z]) front_arm();
  translate([0,0,rear_arm_z]) rear_arm();
  // Sobreposição de 0.03 mm evita faces apenas tangentes na união.
  translate([0,mount_y,-front_spacer_height-0.03]) spacer(front_spacer_height+0.06);
  translate([0,mount_y,frame_depth-0.03]) spacer(rear_spacer_height+0.06);
}
else if(part=="exploded") assembly(12);
else if(part=="layout") {
  frame();
  translate([55,0,0]) front_arm();
  translate([80,0,0]) rear_arm();
  translate([55,-15,0]) spacer(front_spacer_height);
  translate([80,-15,0]) spacer(rear_spacer_height);
}
else assembly();
